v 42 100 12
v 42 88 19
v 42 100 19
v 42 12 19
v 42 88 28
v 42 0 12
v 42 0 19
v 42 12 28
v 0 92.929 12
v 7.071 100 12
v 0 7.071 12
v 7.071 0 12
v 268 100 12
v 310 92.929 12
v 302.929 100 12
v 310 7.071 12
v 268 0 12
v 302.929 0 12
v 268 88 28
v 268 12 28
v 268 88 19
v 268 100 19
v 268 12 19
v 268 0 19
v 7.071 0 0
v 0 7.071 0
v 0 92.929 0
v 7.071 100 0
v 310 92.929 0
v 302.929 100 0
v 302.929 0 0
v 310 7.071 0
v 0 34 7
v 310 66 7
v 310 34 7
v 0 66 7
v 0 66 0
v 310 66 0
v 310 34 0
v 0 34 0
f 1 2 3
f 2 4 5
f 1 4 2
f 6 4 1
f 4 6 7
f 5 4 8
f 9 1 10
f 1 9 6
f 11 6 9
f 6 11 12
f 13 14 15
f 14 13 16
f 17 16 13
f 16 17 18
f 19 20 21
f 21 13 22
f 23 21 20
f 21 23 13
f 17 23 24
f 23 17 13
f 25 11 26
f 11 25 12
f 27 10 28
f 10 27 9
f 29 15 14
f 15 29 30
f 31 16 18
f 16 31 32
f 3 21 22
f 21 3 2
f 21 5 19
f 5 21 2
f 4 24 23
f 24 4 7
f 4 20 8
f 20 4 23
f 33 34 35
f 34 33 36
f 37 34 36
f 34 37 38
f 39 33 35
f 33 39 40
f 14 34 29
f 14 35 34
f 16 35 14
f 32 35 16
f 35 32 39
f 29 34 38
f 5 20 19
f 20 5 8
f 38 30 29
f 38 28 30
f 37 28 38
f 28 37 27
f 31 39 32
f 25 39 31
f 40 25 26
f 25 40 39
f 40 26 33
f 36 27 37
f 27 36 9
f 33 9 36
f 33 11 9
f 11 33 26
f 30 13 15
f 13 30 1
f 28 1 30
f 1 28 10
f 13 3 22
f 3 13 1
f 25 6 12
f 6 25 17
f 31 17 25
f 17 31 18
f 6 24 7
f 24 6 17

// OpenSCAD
include <../src/wardrobe.scad>;
plank_zx_rear_middle();
//github_openscad -o wardrobe_3/plank_zx_rear_middle.stl -D wardrobe_n=3 -D cutting_edge=0 -D break_view_length=0 wardrobe_3/plank_zx_rear_middle_stl.scad
